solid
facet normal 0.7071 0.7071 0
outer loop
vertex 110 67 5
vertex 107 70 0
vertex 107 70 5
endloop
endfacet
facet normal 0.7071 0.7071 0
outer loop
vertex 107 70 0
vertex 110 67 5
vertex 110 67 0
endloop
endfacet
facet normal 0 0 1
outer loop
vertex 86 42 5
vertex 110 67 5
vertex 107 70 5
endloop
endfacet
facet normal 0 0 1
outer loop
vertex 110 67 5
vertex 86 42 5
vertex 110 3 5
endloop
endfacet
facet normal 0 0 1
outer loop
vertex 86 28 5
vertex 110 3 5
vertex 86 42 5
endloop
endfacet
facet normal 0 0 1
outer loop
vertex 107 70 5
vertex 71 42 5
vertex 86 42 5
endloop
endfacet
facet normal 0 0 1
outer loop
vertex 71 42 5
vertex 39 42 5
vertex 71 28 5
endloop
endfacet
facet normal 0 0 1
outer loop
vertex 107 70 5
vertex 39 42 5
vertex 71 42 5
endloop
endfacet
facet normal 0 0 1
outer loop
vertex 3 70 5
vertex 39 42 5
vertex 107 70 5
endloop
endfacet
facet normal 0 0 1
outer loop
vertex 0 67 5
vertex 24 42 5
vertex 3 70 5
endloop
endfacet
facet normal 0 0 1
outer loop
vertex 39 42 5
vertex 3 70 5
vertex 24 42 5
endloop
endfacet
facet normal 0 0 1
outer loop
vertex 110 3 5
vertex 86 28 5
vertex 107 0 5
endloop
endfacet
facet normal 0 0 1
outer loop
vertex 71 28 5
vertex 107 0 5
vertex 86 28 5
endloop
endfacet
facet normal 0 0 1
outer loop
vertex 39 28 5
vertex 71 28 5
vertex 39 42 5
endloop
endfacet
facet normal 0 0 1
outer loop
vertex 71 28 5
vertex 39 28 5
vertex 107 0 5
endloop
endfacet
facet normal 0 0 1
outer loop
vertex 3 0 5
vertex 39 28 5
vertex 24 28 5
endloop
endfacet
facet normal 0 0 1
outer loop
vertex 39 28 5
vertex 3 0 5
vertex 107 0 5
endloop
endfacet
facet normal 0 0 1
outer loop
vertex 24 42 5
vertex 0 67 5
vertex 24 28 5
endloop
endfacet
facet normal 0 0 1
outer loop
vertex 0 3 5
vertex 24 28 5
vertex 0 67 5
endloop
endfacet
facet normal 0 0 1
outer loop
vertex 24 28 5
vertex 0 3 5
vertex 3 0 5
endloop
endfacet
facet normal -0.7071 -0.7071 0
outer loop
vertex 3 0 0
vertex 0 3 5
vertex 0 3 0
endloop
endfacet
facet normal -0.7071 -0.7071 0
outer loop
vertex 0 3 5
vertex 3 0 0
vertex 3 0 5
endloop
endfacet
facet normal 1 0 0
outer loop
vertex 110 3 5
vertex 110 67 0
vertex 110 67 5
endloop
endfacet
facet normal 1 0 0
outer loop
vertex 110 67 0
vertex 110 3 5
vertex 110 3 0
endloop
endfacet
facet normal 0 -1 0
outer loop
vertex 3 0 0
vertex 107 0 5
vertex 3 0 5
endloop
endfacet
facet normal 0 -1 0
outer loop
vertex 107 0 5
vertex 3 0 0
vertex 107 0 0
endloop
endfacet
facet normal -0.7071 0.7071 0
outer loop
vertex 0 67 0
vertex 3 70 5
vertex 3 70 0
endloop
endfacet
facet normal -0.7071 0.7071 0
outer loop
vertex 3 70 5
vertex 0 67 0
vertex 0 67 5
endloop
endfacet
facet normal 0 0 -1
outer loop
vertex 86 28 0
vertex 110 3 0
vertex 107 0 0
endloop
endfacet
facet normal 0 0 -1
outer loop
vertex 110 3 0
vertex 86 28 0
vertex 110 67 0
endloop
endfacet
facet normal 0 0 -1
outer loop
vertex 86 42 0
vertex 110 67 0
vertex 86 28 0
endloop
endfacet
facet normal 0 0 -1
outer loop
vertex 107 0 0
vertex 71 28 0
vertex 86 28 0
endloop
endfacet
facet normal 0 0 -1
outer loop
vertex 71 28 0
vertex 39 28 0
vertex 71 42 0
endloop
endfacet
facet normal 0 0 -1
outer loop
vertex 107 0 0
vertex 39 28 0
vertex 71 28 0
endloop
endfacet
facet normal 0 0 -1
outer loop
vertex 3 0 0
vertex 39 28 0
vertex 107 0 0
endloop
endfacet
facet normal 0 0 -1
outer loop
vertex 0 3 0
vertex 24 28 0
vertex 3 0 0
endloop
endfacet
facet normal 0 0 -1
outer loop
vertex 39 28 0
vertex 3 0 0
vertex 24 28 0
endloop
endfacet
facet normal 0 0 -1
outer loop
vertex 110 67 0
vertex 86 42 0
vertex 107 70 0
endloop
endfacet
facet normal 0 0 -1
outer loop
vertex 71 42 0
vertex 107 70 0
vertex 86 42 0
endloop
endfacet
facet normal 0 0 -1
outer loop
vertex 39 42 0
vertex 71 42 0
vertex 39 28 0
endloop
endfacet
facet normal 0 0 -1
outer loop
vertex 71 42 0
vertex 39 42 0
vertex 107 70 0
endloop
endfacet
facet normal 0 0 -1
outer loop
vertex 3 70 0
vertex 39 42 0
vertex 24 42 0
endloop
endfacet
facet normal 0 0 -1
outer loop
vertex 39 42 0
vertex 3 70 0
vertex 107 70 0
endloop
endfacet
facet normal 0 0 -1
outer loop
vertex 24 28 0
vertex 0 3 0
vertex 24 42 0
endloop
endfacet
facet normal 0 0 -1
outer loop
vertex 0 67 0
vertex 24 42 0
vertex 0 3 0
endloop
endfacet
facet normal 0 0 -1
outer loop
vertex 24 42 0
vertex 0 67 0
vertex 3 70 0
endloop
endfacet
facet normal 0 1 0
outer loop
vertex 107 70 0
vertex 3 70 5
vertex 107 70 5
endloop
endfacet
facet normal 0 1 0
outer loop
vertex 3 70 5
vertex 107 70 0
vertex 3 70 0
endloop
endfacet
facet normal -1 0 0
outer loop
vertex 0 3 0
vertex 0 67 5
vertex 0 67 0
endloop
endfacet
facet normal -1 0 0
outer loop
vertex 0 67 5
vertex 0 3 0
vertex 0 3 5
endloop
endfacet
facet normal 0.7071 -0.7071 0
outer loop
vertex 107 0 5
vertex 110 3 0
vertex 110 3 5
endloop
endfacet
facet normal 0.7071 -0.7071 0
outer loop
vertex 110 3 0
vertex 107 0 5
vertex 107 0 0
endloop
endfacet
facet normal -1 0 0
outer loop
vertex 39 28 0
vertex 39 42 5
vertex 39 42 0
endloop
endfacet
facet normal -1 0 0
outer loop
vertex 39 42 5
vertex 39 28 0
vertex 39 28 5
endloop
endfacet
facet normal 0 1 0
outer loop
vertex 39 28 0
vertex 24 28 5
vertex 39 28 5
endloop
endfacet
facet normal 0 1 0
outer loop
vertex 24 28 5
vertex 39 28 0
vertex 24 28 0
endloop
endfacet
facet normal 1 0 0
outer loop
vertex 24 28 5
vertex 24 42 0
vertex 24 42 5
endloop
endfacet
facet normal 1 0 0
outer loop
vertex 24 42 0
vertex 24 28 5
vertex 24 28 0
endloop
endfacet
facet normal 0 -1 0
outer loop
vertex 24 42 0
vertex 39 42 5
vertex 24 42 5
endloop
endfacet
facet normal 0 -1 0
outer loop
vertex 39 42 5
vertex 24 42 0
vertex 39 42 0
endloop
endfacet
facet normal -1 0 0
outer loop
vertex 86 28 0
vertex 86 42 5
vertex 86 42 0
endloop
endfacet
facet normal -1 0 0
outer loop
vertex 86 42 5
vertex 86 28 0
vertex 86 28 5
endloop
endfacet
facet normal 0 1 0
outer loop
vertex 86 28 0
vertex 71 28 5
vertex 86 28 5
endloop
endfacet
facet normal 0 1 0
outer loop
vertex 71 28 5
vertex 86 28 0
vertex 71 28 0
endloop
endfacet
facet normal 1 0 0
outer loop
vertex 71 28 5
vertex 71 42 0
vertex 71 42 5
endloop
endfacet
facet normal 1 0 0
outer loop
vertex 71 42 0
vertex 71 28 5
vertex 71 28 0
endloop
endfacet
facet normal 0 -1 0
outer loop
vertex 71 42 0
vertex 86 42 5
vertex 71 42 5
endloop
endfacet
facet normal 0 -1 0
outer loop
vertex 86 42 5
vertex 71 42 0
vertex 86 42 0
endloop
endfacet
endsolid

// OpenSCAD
$fn = 32;

// ----------------------------------------------------------------------
// Windowed plate: 2 voids, 110 x 70 x 5 mm
// ----------------------------------------------------------------------

// --- parameters (mm) ---
plate_l = 110;            // plate length, X
plate_w = 70;             // plate width, Y
plate_t = 5;              // plate thickness, Z
edge_margin = 8;          // wall from the plate edge to any window
windows = 2;              // number of windows in the row
win_l = 15;               // window length
win_w = 14;               // window width
win_pitch = 47;           // window pitch along X
depth_1 = 5;              // depth of void 1 (full thickness = through)
depth_2 = 5;              // depth of void 2 (full thickness = through)
corner_c = 3;             // corner chamfer of the plate

profile = [[3, 0], [107, 0], [110, 3], [110, 67], [107, 70], [3, 70], [0, 67], [0, 3]];  // primary outline, 8 points, counter clockwise
void_1 = [[24, 28], [39, 28], [39, 42], [24, 42]];  // window 1 of the row, 4 points
void_2 = [[71, 28], [86, 28], [86, 42], [71, 42]];  // window 2 of the row, 4 points

// --- the one profile operation ---
difference() {
  linear_extrude(height = plate_t) polygon(points = profile);
  translate([0, 0, -1])
    linear_extrude(height = plate_t + 2) polygon(points = void_1);
  translate([0, 0, -1])
    linear_extrude(height = plate_t + 2) polygon(points = void_2);
}
